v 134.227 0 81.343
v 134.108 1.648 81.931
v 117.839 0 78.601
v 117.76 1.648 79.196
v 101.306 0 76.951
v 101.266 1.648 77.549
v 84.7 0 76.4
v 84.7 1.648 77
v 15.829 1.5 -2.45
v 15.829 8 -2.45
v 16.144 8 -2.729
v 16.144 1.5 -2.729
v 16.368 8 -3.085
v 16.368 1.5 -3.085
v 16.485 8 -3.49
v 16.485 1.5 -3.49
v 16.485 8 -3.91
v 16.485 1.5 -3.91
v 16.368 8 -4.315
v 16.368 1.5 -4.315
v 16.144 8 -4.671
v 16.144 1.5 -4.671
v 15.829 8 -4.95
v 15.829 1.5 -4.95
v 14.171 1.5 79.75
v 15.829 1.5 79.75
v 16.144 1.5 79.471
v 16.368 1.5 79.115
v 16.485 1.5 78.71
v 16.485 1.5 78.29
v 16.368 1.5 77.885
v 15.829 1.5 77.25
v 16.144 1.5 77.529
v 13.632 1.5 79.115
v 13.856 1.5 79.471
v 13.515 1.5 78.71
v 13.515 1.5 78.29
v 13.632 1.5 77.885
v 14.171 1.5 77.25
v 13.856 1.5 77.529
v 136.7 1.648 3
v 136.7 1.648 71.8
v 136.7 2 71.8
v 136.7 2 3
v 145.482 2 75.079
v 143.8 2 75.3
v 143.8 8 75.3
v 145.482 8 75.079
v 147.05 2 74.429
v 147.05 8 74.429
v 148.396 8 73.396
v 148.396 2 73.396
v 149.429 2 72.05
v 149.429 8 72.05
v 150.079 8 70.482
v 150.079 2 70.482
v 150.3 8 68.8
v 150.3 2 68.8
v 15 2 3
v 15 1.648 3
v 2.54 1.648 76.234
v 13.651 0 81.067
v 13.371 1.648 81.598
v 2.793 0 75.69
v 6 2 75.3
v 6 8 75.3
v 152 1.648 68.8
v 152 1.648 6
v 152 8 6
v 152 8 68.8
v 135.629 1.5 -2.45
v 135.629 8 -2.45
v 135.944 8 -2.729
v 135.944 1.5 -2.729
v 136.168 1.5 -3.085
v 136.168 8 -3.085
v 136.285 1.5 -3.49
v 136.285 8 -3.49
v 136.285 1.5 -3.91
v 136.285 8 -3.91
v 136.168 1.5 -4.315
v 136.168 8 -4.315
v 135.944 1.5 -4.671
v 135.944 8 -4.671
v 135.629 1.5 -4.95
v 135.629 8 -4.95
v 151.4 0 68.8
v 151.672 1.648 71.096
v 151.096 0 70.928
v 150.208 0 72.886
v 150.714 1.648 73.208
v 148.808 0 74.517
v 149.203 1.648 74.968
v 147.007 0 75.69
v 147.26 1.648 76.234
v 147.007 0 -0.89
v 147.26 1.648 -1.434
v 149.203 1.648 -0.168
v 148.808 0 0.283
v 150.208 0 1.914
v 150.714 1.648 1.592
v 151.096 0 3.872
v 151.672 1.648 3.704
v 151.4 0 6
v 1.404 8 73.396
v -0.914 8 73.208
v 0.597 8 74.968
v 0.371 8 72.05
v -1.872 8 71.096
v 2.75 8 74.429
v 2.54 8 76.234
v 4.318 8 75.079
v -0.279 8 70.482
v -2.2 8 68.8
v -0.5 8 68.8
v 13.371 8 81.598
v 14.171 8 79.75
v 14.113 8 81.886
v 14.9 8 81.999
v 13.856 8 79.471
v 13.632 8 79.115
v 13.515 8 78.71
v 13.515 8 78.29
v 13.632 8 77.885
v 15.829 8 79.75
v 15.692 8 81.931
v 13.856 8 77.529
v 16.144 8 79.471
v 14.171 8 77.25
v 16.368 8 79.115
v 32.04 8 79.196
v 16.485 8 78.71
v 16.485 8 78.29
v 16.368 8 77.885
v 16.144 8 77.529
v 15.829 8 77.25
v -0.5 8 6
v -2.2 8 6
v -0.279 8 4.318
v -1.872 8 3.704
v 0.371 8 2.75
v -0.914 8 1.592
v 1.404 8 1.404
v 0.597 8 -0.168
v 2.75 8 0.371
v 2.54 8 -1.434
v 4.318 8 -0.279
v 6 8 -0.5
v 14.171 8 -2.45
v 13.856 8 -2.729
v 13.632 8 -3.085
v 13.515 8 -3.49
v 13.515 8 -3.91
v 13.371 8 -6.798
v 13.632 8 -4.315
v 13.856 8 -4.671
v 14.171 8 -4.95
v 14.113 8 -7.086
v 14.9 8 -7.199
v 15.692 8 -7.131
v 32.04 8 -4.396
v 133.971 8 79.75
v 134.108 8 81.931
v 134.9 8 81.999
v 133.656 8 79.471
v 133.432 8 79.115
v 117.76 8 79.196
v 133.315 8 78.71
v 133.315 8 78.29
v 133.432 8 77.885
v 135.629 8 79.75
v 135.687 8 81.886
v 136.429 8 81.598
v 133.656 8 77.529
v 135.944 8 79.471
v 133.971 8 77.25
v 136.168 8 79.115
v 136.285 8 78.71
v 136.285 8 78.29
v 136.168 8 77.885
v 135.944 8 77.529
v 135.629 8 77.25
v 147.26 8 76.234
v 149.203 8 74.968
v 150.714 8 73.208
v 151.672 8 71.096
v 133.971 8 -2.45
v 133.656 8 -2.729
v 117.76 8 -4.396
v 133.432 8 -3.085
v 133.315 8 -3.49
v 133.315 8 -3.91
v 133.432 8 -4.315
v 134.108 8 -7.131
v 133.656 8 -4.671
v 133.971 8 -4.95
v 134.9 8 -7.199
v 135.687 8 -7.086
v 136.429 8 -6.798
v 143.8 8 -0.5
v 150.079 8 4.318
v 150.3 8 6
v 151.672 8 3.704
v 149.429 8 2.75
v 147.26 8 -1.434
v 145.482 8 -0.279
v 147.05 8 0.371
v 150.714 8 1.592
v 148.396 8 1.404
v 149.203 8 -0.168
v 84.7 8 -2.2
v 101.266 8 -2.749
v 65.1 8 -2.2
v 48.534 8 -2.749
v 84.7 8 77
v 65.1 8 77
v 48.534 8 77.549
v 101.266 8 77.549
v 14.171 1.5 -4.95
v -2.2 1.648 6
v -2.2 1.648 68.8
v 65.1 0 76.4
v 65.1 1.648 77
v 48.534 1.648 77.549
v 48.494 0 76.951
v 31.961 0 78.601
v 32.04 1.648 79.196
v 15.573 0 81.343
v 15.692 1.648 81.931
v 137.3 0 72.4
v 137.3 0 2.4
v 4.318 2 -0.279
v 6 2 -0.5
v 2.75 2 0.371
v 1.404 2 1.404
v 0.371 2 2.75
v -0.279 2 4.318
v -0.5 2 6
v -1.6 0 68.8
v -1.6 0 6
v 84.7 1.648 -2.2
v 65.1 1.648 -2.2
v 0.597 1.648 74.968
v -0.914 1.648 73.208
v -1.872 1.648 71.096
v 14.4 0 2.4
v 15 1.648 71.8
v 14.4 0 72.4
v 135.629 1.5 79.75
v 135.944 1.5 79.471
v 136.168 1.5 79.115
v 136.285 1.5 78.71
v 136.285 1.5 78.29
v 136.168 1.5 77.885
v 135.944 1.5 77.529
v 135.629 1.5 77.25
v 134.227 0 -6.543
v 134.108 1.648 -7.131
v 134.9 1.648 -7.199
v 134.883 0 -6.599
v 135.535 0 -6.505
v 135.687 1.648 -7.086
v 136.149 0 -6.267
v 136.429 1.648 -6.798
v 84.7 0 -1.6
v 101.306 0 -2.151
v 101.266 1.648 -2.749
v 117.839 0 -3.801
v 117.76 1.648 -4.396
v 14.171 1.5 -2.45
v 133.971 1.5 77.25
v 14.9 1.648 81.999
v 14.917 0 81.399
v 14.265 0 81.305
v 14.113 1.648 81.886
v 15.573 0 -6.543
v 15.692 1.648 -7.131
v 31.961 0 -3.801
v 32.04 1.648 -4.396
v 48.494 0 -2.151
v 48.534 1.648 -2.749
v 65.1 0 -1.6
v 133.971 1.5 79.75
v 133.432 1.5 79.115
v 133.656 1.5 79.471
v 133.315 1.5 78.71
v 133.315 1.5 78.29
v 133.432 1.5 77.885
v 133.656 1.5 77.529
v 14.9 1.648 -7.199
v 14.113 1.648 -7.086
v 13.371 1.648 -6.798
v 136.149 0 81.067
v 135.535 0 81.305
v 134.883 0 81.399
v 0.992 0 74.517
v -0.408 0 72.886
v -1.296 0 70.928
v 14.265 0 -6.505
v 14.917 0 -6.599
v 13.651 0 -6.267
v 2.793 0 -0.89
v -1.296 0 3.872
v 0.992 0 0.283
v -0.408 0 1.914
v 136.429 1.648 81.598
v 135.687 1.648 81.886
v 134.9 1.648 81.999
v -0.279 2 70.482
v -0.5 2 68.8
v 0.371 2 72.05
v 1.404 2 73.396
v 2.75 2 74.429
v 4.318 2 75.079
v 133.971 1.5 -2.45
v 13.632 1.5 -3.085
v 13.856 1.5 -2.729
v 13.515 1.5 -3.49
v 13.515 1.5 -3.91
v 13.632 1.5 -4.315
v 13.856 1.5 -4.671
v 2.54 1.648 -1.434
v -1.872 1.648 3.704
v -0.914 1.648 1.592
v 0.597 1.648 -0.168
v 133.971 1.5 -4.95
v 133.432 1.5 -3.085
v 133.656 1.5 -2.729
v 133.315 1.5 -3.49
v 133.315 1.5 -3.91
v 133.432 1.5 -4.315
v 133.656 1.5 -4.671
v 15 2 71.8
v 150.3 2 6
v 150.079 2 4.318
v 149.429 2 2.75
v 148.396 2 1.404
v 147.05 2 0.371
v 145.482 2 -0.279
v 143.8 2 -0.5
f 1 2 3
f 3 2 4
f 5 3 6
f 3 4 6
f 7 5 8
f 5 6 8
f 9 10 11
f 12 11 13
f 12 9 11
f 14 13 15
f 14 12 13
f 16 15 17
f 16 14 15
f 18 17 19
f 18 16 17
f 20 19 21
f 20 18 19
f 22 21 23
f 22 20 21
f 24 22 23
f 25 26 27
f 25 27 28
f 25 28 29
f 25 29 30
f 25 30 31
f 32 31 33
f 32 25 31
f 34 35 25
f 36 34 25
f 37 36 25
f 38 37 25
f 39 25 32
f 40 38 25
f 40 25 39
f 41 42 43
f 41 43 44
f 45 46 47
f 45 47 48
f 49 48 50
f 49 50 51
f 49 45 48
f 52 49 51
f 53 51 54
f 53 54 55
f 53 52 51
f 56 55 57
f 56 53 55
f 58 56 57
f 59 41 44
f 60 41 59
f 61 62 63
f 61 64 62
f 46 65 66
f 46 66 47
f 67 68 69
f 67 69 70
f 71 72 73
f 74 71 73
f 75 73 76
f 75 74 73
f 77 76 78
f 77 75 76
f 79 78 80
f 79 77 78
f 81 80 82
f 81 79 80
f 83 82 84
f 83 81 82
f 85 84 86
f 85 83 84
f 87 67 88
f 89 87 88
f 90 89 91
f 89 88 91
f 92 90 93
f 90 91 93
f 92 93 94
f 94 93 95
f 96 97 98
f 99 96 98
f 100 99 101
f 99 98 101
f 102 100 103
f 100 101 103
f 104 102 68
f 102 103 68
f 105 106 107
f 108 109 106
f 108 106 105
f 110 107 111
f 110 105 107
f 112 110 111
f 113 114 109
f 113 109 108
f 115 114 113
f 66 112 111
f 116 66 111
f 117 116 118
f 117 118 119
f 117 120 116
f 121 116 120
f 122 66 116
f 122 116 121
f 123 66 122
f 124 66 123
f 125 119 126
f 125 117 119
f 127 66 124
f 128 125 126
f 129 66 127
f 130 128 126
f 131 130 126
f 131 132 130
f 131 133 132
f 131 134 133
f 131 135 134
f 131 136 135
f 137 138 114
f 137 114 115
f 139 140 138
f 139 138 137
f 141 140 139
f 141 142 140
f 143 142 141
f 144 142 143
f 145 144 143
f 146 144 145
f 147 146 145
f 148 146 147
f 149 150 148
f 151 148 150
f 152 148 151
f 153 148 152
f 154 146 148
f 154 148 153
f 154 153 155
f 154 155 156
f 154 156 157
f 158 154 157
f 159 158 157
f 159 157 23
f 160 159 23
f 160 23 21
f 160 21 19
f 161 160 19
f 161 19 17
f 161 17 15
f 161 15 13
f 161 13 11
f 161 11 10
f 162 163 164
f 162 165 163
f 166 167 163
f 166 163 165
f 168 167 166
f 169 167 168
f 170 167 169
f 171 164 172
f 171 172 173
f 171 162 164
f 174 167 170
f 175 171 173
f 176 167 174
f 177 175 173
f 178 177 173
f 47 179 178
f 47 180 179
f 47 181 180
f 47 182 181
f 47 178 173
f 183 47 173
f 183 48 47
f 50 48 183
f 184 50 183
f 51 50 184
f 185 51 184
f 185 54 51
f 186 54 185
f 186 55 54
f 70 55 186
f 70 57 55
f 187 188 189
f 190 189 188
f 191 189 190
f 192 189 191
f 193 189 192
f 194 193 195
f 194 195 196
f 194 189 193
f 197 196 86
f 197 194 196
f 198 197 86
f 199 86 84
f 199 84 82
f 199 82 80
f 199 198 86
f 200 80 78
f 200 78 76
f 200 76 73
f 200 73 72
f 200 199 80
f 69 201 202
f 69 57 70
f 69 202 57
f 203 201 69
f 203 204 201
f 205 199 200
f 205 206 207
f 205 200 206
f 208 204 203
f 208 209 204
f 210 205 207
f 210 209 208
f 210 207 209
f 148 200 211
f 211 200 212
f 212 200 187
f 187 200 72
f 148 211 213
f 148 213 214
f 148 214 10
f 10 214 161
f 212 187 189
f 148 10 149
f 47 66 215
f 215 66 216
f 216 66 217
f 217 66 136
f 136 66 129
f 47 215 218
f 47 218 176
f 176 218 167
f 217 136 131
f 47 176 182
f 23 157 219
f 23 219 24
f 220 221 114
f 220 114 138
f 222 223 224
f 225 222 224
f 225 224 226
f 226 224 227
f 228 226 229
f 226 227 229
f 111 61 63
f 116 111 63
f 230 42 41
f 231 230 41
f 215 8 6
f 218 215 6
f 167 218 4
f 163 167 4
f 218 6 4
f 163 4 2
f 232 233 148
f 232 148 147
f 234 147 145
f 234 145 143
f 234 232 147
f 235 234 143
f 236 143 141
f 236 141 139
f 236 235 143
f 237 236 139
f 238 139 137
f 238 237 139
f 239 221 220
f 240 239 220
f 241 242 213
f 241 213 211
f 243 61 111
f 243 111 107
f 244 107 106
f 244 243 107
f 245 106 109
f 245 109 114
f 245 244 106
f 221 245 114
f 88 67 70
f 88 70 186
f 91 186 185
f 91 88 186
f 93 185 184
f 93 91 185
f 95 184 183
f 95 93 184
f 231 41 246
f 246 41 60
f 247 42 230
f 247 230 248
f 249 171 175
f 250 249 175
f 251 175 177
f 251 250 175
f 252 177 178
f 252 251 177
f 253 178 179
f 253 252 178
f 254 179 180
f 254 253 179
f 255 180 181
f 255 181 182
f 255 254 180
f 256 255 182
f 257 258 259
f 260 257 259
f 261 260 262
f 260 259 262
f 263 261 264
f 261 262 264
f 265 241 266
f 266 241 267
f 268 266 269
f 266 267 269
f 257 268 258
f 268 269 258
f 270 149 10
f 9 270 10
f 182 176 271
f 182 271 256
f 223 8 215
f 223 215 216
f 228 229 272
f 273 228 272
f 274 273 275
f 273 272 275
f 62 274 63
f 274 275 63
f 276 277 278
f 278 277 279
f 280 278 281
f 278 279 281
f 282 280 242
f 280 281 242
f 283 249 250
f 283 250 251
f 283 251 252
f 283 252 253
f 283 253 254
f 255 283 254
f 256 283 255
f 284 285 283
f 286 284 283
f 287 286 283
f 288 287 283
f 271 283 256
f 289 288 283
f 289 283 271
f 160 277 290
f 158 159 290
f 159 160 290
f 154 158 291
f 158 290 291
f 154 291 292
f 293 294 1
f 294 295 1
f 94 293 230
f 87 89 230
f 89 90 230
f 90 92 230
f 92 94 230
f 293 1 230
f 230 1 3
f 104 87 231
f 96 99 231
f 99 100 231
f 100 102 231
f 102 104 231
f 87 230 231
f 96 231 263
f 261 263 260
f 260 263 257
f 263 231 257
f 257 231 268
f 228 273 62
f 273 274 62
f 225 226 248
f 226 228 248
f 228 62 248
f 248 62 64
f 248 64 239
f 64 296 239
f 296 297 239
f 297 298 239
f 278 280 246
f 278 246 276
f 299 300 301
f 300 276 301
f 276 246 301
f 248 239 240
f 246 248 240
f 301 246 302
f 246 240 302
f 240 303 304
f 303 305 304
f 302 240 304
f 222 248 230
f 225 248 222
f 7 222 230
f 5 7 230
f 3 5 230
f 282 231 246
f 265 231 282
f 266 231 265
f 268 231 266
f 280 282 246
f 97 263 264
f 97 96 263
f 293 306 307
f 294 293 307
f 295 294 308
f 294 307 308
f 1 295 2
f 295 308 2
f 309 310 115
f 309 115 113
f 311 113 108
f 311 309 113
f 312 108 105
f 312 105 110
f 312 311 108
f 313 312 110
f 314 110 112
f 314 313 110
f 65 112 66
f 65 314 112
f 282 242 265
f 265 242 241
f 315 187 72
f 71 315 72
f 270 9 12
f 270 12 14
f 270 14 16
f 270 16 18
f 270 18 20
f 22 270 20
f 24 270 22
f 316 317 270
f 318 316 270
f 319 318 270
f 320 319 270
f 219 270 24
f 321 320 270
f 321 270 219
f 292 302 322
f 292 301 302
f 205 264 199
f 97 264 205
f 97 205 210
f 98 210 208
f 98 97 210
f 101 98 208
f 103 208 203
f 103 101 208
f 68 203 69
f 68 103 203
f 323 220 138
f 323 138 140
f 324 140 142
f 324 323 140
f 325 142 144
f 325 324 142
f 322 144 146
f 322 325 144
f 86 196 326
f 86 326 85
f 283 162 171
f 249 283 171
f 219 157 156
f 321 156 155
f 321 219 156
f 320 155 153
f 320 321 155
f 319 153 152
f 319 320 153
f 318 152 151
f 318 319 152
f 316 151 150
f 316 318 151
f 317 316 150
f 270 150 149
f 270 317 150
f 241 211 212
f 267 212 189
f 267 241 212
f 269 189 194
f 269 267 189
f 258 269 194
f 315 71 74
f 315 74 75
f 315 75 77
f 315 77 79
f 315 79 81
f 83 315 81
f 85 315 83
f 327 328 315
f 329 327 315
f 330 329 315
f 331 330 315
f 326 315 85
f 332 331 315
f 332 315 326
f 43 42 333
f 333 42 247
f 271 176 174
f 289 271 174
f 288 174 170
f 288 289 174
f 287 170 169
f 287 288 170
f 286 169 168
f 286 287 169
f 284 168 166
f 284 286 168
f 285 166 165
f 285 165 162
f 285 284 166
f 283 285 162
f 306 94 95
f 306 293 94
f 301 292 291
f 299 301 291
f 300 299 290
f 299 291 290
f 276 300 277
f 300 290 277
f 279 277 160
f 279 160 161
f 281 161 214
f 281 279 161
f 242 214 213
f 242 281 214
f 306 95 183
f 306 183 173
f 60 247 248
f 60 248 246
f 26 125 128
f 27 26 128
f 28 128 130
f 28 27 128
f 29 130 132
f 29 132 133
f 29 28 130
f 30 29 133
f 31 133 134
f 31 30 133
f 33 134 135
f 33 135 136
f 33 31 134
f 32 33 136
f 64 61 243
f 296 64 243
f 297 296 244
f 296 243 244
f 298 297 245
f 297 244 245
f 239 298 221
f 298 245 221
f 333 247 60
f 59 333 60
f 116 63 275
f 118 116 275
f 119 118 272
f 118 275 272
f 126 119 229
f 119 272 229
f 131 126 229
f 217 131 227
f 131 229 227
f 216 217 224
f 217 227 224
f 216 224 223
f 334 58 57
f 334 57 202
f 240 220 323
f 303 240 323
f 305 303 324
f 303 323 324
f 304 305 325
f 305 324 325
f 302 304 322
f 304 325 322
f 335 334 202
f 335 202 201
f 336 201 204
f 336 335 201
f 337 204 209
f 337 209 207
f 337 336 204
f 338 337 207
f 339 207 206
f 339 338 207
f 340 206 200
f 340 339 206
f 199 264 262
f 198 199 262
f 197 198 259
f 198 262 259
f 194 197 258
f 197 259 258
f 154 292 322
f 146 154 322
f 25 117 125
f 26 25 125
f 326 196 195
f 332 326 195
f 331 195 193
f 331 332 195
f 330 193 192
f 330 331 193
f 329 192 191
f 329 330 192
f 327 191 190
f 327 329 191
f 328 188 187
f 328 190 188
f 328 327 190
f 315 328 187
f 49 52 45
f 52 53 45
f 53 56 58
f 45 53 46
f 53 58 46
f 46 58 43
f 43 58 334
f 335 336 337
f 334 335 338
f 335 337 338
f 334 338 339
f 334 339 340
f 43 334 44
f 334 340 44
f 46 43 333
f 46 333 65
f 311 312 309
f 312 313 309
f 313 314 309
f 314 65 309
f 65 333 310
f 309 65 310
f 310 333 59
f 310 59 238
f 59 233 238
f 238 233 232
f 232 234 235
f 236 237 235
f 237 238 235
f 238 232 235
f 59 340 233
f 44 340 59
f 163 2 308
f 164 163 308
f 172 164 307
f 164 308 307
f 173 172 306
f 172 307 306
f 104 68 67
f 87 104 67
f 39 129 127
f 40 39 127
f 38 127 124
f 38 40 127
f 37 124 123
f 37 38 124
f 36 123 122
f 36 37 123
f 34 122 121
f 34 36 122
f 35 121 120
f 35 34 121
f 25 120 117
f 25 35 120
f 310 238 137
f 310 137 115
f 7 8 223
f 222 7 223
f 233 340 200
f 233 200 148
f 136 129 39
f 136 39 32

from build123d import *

# Parameters (mm, degrees)
EXTRUDE_1_DEPTH       = 2
EXTRUDE_2_DEPTH       = 8
SKETCH_6_R            = 3.5
SKETCH_6_R_2          = 1.5
EXTRUDE_10_DEPTH      = 8
SKETCH_7_W            = 121.7
SKETCH_7_H            = 68.8
CUT_EXTRUDE_1_DEPTH   = 10
FILLET_1_R            = 250
SKETCH_6_2_R          = 1.5
EXTRUDE_11_DEPTH      = 1.5
CHAMFER_1_SIZE        = 0.6
CHAMFER_1_SIZE2       = 1.648486452
CUT_EXTRUDE_START     = -6
CUT_EXTRUDE_1_2_DEPTH = 6
SKETCH_12_W           = 7.981613131
SKETCH_12_H           = 4.067552846
SKETCH_12_W_2         = 5
SKETCH_12_H_2         = 2.5
SKETCH_12_W_3         = 6.44213445
SKETCH_12_H_3         = 4.018836203
SKETCH_12_W_4         = 6.293487169
SKETCH_12_H_4         = 3.99394378
SKETCH_12_W_5         = 6.35997617
EXTRUDE_12_DEPTH      = 6.5


with BuildPart() as part:
    # 草图1 → 凸台-拉伸1 (new body)
    with BuildSketch(Plane(origin=(0, 0, 0), x_dir=(1, 0, 0), z_dir=(0, 1, 0))):
        with BuildLine():
            Line((6, 0.2), (143.8, 0.2))
            ThreePointArc((143.8, 0.2), (148.184062043, -1.615937957), (150, -6))
            Line((150, -6), (150, -68.8))
            ThreePointArc((150, -68.8), (148.184062043, -73.184062043), (143.8, -75))
            Line((143.8, -75), (6, -75))
            ThreePointArc((6, -75), (1.615937957, -73.184062043), (-0.2, -68.8))
            Line((-0.2, -68.8), (-0.2, -6))
            ThreePointArc((-0.2, -6), (1.615937957, -1.615937957), (6, 0.2))
        make_face()
    extrude(amount=EXTRUDE_1_DEPTH)

    # 草图1<5> → 拉伸-薄壁2 (add)
    with BuildSketch(Plane(origin=(0, 0, 0), x_dir=(1, 0, 0), z_dir=(0, 1, 0))):
        with BuildLine():
            Line((6, 2.2), (143.8, 2.2))
            ThreePointArc((143.8, 2.2), (149.598275606, -0.201724394), (152, -6))
            Line((152, -6), (152, -68.8))
            ThreePointArc((152, -68.8), (149.598275606, -74.598275606), (143.8, -77))
            Line((143.8, -77), (6, -77))
            ThreePointArc((6, -77), (0.201724394, -74.598275606), (-2.2, -68.8))
            Line((-2.2, -68.8), (-2.2, -6))
            ThreePointArc((-2.2, -6), (0.201724394, -0.201724394), (6, 2.2))
        make_face()
        with BuildLine():
            Line((6, 0.2), (143.8, 0.2))
            ThreePointArc((143.8, 0.2), (148.184062043, -1.615937957), (150, -6))
            Line((150, -6), (150, -68.8))
            ThreePointArc((150, -68.8), (148.184062043, -73.184062043), (143.8, -75))
            Line((143.8, -75), (6, -75))
            ThreePointArc((6, -75), (1.615937957, -73.184062043), (-0.2, -68.8))
            Line((-0.2, -68.8), (-0.2, -6))
            ThreePointArc((-0.2, -6), (1.615937957, -1.615937957), (6, 0.2))
        make_face(mode=Mode.SUBTRACT)
    extrude(amount=EXTRUDE_2_DEPTH)

    # 草图6 → 凸台-拉伸10 (add)
    # profile 1 of 4: a face of its own
    with BuildSketch(Plane(origin=(0, 0, 0), x_dir=(1, 0, 0), z_dir=(0, 1, 0))):
        with Locations((15, 3.7)):
            Circle(SKETCH_6_R)
        with Locations(Location((15, 3.7, 0), (0, 0, 90))):
            Circle(SKETCH_6_R_2, mode=Mode.SUBTRACT)
    # profile 2 of 4: a face of its own
    with BuildSketch(Plane(origin=(0, 0, 0), x_dir=(1, 0, 0), z_dir=(0, 1, 0))):
        with Locations((15, -78.5)):
            Circle(SKETCH_6_R)
        with Locations(Location((15, -78.5, 0), (0, 0, 90))):
            Circle(SKETCH_6_R_2, mode=Mode.SUBTRACT)
    # profile 3 of 4: a face of its own
    with BuildSketch(Plane(origin=(0, 0, 0), x_dir=(1, 0, 0), z_dir=(0, 1, 0))):
        with Locations((134.8, 3.7)):
            Circle(SKETCH_6_R)
        with Locations(Location((134.8, 3.7, 0), (0, 0, 90))):
            Circle(SKETCH_6_R_2, mode=Mode.SUBTRACT)
    # profile 4 of 4: a face of its own
    with BuildSketch(Plane(origin=(0, 0, 0), x_dir=(1, 0, 0), z_dir=(0, 1, 0))):
        with Locations((134.8, -78.5)):
            Circle(SKETCH_6_R)
        with Locations(Location((134.8, -78.5, 0), (0, 0, 90))):
            Circle(SKETCH_6_R_2, mode=Mode.SUBTRACT)
    extrude(amount=EXTRUDE_10_DEPTH)

    # 草图7 → Cut-Extrude 1 (cut)
    with BuildSketch(Plane(origin=(0, 0, 0), x_dir=(-1, 0, 0), z_dir=(0, -1, 0))):
        with Locations((-75.85, -37.4)):
            Rectangle(SKETCH_7_W, SKETCH_7_H)
    extrude(amount=-CUT_EXTRUDE_1_DEPTH, mode=Mode.SUBTRACT)

    # 圆角1
    fillet_1_edges = [part.edges().sort_by_distance(p)[0] for p in [
        (18.16227766, 4, 77),
        (11.83772234, 4, 77),
        (137.96227766, 4, 77),
        (131.63772234, 4, 77),
        (131.63772234, 4, -2.2),
        (137.96227766, 4, -2.2),
        (11.83772234, 4, -2.2),
        (18.16227766, 4, -2.2),
    ]]
    fillet(fillet_1_edges, radius=FILLET_1_R)

    # 草图6<2> → 凸台-拉伸11 (add)
    with BuildSketch(Plane(origin=(0, 0, 0), x_dir=(1, 0, 0), z_dir=(0, 1, 0))):
        with Locations(Location((15, 3.7, 0), (0, 0, 90))):
            Circle(SKETCH_6_2_R)
        with Locations(Location((15, -78.5, 0), (0, 0, 90))):
            Circle(SKETCH_6_2_R)
        with Locations(Location((134.8, 3.7, 0), (0, 0, 90))):
            Circle(SKETCH_6_2_R)
        with Locations(Location((134.8, -78.5, 0), (0, 0, 90))):
            Circle(SKETCH_6_2_R)
    extrude(amount=EXTRUDE_11_DEPTH)

    # 倒角1
    chamfer_1_edges = [part.edges().sort_by_distance(p)[0] for p in [
        (136.7, 0, 37.4),
        (75.85, 0, 71.8),
        (15, 0, 37.4),
        (75.85, 0, 3),
        (14.502874151, 0, 81.964515246),
        (74.9, 0, 77),
        (135.297125849, 0, 81.964515246),
        (150.714252509, 0, 73.20830038),
        (135.297125849, 0, -7.164515246),
        (74.9, 0, -2.2),
        (14.502874151, 0, -7.164515246),
        (-0.914252509, 0, 1.59169962),
        (7.988030543, 0, 78.850628869),
        (40.273083878, 0, 78.235796001),
        (141.811969457, 0, 78.850628869),
        (109.526916122, 0, 78.235796001),
        (141.811969457, 0, -4.050628869),
        (109.526916122, 0, -3.435796001),
        (7.988030543, 0, -4.050628869),
        (40.273083878, 0, -3.435796001),
        (-2.2, 0, 37.4),
        (-0.914252509, 0, 73.20830038),
        (152, 0, 37.4),
        (150.714252509, 0, 1.59169962),
    ]]
    chamfer_1_side = [part.faces().sort_by_distance(p)[0] for p in [
        (0.58783664, 0, 72.250617658),
    ]]
    chamfer(chamfer_1_edges, length=CHAMFER_1_SIZE, length2=CHAMFER_1_SIZE2, reference=chamfer_1_side[0])

    # 草图11 → Cut-Extrude 1 2 (cut)
    with BuildSketch(Plane(origin=(0, 8, 0), x_dir=(1, 0, 0), z_dir=(0, 1, 0)).offset(CUT_EXTRUDE_START)):
        with BuildLine():
            Line((143.8, 0.5), (6, 0.5))
            ThreePointArc((6, 0.5), (1.403805922, -1.403805922), (-0.5, -6))
            Line((-0.5, -6), (-0.5, -68.8))
            ThreePointArc((-0.5, -68.8), (1.403805922, -73.396194078), (6, -75.3))
            Line((6, -75.3), (143.8, -75.3))
            ThreePointArc((143.8, -75.3), (148.396194078, -73.396194078), (150.3, -68.8))
            Line((150.3, -68.8), (150.3, -6))
            ThreePointArc((150.3, -6), (148.396194078, -1.403805922), (143.8, 0.5))
        make_face()
        with BuildLine():
            Line((143.8, 0.2), (6, 0.2))
            ThreePointArc((6, 0.2), (1.615937957, -1.615937957), (-0.2, -6))
            Line((-0.2, -6), (-0.2, -68.8))
            ThreePointArc((-0.2, -68.8), (1.615937957, -73.184062043), (6, -75))
            Line((6, -75), (143.8, -75))
            ThreePointArc((143.8, -75), (148.184062043, -73.184062043), (150, -68.8))
            Line((150, -68.8), (150, -6))
            ThreePointArc((150, -6), (148.184062043, -1.615937957), (143.8, 0.2))
        make_face(mode=Mode.SUBTRACT)
    extrude(amount=CUT_EXTRUDE_1_2_DEPTH, mode=Mode.SUBTRACT)

    # 草图12 → 凸台-拉伸12 (add)
    # profile 1 of 4: a face of its own
    with BuildSketch(Plane(origin=(0, 8, 0), x_dir=(1, 0, 0), z_dir=(0, 1, 0))):
        with Locations((15.444728275, 3.558916951)):
            Rectangle(SKETCH_12_W, SKETCH_12_H)
        with Locations((15, 3.7)):
            Rectangle(SKETCH_12_W_2, SKETCH_12_H_2, mode=Mode.SUBTRACT)
    # profile 2 of 4: a face of its own
    with BuildSketch(Plane(origin=(0, 8, 0), x_dir=(1, 0, 0), z_dir=(0, 1, 0))):
        with Locations((134.555490907, 3.789730855)):
            Rectangle(SKETCH_12_W_3, SKETCH_12_H_3)
        with Locations((134.8, 3.7)):
            Rectangle(SKETCH_12_W_2, SKETCH_12_H_2, mode=Mode.SUBTRACT)
    # profile 3 of 4: a face of its own
    with BuildSketch(Plane(origin=(0, 8, 0), x_dir=(1, 0, 0), z_dir=(0, 1, 0))):
        with Locations((134.721799576, -78.476357082)):
            Rectangle(SKETCH_12_W_4, SKETCH_12_H_4)
        with Locations((134.8, -78.5)):
            Rectangle(SKETCH_12_W_2, SKETCH_12_H_2, mode=Mode.SUBTRACT)
    # profile 4 of 4: a face of its own
    with BuildSketch(Plane(origin=(0, 8, 0), x_dir=(1, 0, 0), z_dir=(0, 1, 0))):
        with Locations((15.237842113, -78.476357082)):
            Rectangle(SKETCH_12_W_5, SKETCH_12_H_4)
        with Locations((15, -78.5)):
            Rectangle(SKETCH_12_W_2, SKETCH_12_H_2, mode=Mode.SUBTRACT)
    extrude(amount=-EXTRUDE_12_DEPTH)


solid = part.part
